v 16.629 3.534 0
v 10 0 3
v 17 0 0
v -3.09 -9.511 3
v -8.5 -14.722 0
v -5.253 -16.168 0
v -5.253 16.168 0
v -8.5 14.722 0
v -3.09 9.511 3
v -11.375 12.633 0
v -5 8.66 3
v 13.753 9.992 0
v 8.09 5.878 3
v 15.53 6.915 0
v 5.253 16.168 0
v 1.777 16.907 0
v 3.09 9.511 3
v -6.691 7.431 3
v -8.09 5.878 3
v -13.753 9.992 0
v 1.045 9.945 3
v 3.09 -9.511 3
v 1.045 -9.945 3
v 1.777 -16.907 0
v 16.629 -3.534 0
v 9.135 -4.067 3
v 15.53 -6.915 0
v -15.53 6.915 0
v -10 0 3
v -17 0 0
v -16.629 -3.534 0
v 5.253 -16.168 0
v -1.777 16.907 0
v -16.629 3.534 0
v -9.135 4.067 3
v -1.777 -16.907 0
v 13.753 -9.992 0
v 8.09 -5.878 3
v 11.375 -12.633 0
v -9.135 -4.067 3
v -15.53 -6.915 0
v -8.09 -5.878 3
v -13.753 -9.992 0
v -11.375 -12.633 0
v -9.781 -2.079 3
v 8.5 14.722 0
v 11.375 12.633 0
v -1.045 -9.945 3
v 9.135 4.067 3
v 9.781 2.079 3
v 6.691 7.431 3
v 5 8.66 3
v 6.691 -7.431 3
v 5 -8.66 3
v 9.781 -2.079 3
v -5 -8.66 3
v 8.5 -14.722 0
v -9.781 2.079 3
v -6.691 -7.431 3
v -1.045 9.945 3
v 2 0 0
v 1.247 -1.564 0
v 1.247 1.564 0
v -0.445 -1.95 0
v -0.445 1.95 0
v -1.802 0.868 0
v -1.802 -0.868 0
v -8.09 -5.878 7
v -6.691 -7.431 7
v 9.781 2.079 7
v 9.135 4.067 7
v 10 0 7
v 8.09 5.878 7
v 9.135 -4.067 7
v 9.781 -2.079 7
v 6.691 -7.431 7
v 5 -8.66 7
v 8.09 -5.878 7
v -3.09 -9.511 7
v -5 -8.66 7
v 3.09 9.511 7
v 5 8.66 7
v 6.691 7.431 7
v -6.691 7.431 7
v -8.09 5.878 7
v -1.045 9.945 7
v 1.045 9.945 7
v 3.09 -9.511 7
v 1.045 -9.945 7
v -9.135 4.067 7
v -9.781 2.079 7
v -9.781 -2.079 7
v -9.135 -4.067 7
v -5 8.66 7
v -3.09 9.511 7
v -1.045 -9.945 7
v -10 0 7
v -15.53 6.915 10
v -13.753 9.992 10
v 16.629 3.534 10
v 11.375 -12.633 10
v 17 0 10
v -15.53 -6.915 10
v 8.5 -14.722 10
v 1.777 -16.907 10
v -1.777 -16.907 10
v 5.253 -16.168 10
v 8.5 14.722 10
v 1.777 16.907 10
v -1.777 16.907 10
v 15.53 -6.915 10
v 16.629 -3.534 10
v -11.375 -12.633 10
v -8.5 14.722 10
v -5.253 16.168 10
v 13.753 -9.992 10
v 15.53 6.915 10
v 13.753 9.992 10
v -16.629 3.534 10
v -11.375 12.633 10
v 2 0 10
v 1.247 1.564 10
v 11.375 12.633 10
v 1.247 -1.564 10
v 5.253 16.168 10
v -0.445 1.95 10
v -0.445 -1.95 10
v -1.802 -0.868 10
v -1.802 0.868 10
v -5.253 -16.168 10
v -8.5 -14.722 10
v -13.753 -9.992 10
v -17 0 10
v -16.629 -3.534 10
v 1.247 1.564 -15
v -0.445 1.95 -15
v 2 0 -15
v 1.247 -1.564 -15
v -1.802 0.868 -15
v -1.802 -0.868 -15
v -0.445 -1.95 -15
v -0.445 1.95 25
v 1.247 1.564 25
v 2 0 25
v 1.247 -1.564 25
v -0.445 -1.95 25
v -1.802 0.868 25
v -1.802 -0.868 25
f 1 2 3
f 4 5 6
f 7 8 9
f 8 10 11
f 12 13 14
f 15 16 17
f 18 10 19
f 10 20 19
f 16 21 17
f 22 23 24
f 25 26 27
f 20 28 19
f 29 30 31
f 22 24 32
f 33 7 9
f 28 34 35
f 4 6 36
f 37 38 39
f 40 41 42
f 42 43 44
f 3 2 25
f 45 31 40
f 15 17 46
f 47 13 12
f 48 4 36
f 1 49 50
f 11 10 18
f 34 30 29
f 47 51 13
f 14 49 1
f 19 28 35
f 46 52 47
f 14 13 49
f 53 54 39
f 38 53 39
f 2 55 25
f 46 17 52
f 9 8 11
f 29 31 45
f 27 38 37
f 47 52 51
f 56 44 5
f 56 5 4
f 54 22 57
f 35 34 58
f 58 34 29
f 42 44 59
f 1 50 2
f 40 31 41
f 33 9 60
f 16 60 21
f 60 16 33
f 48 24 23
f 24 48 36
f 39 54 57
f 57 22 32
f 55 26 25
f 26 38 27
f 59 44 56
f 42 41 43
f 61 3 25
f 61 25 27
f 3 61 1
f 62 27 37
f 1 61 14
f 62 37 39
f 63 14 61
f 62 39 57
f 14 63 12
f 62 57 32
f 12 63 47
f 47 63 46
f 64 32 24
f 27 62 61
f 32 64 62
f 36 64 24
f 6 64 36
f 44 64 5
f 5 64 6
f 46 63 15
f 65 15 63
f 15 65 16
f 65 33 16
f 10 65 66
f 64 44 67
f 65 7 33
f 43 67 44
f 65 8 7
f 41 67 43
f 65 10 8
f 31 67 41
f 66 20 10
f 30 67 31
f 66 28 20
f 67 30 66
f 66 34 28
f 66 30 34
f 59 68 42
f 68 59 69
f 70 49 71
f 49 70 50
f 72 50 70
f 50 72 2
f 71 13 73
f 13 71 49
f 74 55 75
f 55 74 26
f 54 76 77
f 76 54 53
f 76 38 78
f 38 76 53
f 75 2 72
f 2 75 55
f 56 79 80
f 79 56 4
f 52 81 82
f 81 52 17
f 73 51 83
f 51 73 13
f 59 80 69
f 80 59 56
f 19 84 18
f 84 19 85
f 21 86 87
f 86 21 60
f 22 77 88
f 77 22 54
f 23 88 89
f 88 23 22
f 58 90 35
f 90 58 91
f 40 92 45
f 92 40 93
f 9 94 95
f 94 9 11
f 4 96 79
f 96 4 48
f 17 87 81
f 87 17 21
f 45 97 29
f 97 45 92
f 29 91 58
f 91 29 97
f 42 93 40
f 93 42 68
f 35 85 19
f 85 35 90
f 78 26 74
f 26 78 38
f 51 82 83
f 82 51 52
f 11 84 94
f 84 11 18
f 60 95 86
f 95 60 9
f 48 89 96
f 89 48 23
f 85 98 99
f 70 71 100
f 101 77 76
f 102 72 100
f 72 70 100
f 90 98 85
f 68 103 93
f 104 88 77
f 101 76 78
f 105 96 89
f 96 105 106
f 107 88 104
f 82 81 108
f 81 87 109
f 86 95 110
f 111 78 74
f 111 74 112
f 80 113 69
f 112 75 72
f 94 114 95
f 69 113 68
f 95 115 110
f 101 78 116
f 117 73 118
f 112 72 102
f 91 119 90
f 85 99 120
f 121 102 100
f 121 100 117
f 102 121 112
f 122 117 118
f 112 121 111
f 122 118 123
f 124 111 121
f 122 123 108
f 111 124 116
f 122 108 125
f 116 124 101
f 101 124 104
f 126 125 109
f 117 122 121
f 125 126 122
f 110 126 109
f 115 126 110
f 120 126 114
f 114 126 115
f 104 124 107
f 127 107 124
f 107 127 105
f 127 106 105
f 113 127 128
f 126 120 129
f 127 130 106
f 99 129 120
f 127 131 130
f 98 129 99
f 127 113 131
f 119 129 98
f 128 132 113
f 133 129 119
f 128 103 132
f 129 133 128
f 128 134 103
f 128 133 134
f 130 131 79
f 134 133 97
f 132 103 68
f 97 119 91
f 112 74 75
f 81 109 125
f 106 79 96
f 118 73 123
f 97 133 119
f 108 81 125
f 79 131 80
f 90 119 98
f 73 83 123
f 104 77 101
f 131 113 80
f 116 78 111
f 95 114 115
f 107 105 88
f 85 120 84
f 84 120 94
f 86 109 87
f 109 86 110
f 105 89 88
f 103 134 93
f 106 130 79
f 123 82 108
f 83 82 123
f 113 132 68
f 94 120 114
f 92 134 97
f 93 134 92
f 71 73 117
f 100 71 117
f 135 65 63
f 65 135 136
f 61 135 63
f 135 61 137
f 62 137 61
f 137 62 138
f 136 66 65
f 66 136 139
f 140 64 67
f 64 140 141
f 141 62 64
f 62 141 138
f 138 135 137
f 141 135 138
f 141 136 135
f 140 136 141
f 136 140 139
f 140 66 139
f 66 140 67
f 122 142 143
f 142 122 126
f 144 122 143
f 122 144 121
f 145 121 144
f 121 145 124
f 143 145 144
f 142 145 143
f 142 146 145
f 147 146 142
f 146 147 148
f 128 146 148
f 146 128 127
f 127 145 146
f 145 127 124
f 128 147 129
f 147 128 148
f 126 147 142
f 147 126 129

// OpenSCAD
cylinder(3,17,10);
translate ([0,0,3])cylinder(4,10,10);
translate ([0,0,7])cylinder(3,10,17);
translate ([0,0,-15])cylinder(r1=2, r2=2, h=15);
translate ([0,0,10])cylinder(r1=2, r2=2, h=15);
